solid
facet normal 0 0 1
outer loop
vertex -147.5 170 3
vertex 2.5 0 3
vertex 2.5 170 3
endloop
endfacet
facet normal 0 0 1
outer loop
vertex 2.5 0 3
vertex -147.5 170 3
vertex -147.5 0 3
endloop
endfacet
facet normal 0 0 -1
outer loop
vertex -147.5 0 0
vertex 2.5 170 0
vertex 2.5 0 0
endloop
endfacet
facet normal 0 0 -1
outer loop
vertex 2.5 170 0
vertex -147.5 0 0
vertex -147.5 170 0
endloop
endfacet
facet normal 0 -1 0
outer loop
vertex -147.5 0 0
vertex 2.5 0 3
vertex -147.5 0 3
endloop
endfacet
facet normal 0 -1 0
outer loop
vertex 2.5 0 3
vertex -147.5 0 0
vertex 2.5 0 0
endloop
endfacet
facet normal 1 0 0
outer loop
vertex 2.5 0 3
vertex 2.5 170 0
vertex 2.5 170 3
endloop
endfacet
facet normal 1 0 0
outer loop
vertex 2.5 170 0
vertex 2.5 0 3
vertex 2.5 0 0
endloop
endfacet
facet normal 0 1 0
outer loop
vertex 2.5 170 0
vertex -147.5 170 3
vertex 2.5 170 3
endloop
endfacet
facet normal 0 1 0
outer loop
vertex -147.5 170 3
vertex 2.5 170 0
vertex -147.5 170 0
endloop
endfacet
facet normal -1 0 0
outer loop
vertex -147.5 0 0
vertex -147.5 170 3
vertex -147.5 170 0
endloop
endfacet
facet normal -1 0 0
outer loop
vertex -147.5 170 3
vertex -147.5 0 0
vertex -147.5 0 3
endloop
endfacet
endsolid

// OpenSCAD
//for apporopriate alignment of the grid
xoff = 30.5;
yoff = 0.5;
zoff = 2;
plat = 150;
plotXOff = -178;
scaleFac = 25.4;
t0 = "O";
t1 = "N";
t2 = "E";
t3 = "1";
f0 = "Letters/";
f1 = "Letters/";
f2 = "Letters/";
f3 = "Numbers/";
font = "_alpha.dxf";
braille = false;
//quadrant title offsets
qxoff = 30;
qyoff = 8;

//remove excess grid/plot
difference() {
	//align and union the grid and plot
	translate(v = [xoff,yoff,zoff]) { 
		union() {
			linear_extrude(file = "Grid/cleanGrid2.dxf", height = 3, center = false);
			if (braille) {
				translate(v=[-1*xoff,0,0]) linear_extrude(file = "Grid/gridNumQ2.dxf", height = 5, center = false);
			} else { 
				translate(v=[-1*xoff,0,0]) linear_extrude(file = "Grid/gridNumQ2_alpha.dxf", height = 5, center = false);
			}		
			translate(v=[plotXOff,0,0]){
				scale(v = [scaleFac,scaleFac,0]) linear_extrude(file = "Q2.dxf", height = 5, center = false);
			}	
			
		}
	}
	
	//blocks to remove excess
	union() {
		translate(v=[2.5,-5,0]) cube(size = [20,175,10], center=false);
		translate(v=[-170,-20,0]) cube(size = [175,20,10], center=false);
	}
}

//grid platform
translate(v=[-1*(plat-2.5),0,0]) cube(size = [plat,plat+20,3], center = false);
//title bar
first = -10;
translate(v=[first-45,plat+qyoff,zoff]) linear_extrude(file = str(f0,t0,font), height = 5 , center = false);
translate(v=[first-30,plat+qyoff,zoff]) linear_extrude(file = str(f1,t1,font), height = 5 , center = false);
translate(v=[first-15,plat+qyoff,zoff]) linear_extrude(file = str(f2,t2,font), height = 5 , center = false);
translate(v=[first,plat+qyoff,zoff]) linear_extrude(file = str(f3,t3,font), height = 5 , center = false);	
if (braille) {
	translate(v=[-1*(plat-qxoff),plat+qyoff,zoff]) linear_extrude(file = "Grid/two.dxf", height = 5, center = false);	
} else {
	translate(v=[-1*(plat-qxoff),plat+qyoff,zoff]) linear_extrude(file = "Grid/two_alpha.dxf", height = 5 , center = false);
}
